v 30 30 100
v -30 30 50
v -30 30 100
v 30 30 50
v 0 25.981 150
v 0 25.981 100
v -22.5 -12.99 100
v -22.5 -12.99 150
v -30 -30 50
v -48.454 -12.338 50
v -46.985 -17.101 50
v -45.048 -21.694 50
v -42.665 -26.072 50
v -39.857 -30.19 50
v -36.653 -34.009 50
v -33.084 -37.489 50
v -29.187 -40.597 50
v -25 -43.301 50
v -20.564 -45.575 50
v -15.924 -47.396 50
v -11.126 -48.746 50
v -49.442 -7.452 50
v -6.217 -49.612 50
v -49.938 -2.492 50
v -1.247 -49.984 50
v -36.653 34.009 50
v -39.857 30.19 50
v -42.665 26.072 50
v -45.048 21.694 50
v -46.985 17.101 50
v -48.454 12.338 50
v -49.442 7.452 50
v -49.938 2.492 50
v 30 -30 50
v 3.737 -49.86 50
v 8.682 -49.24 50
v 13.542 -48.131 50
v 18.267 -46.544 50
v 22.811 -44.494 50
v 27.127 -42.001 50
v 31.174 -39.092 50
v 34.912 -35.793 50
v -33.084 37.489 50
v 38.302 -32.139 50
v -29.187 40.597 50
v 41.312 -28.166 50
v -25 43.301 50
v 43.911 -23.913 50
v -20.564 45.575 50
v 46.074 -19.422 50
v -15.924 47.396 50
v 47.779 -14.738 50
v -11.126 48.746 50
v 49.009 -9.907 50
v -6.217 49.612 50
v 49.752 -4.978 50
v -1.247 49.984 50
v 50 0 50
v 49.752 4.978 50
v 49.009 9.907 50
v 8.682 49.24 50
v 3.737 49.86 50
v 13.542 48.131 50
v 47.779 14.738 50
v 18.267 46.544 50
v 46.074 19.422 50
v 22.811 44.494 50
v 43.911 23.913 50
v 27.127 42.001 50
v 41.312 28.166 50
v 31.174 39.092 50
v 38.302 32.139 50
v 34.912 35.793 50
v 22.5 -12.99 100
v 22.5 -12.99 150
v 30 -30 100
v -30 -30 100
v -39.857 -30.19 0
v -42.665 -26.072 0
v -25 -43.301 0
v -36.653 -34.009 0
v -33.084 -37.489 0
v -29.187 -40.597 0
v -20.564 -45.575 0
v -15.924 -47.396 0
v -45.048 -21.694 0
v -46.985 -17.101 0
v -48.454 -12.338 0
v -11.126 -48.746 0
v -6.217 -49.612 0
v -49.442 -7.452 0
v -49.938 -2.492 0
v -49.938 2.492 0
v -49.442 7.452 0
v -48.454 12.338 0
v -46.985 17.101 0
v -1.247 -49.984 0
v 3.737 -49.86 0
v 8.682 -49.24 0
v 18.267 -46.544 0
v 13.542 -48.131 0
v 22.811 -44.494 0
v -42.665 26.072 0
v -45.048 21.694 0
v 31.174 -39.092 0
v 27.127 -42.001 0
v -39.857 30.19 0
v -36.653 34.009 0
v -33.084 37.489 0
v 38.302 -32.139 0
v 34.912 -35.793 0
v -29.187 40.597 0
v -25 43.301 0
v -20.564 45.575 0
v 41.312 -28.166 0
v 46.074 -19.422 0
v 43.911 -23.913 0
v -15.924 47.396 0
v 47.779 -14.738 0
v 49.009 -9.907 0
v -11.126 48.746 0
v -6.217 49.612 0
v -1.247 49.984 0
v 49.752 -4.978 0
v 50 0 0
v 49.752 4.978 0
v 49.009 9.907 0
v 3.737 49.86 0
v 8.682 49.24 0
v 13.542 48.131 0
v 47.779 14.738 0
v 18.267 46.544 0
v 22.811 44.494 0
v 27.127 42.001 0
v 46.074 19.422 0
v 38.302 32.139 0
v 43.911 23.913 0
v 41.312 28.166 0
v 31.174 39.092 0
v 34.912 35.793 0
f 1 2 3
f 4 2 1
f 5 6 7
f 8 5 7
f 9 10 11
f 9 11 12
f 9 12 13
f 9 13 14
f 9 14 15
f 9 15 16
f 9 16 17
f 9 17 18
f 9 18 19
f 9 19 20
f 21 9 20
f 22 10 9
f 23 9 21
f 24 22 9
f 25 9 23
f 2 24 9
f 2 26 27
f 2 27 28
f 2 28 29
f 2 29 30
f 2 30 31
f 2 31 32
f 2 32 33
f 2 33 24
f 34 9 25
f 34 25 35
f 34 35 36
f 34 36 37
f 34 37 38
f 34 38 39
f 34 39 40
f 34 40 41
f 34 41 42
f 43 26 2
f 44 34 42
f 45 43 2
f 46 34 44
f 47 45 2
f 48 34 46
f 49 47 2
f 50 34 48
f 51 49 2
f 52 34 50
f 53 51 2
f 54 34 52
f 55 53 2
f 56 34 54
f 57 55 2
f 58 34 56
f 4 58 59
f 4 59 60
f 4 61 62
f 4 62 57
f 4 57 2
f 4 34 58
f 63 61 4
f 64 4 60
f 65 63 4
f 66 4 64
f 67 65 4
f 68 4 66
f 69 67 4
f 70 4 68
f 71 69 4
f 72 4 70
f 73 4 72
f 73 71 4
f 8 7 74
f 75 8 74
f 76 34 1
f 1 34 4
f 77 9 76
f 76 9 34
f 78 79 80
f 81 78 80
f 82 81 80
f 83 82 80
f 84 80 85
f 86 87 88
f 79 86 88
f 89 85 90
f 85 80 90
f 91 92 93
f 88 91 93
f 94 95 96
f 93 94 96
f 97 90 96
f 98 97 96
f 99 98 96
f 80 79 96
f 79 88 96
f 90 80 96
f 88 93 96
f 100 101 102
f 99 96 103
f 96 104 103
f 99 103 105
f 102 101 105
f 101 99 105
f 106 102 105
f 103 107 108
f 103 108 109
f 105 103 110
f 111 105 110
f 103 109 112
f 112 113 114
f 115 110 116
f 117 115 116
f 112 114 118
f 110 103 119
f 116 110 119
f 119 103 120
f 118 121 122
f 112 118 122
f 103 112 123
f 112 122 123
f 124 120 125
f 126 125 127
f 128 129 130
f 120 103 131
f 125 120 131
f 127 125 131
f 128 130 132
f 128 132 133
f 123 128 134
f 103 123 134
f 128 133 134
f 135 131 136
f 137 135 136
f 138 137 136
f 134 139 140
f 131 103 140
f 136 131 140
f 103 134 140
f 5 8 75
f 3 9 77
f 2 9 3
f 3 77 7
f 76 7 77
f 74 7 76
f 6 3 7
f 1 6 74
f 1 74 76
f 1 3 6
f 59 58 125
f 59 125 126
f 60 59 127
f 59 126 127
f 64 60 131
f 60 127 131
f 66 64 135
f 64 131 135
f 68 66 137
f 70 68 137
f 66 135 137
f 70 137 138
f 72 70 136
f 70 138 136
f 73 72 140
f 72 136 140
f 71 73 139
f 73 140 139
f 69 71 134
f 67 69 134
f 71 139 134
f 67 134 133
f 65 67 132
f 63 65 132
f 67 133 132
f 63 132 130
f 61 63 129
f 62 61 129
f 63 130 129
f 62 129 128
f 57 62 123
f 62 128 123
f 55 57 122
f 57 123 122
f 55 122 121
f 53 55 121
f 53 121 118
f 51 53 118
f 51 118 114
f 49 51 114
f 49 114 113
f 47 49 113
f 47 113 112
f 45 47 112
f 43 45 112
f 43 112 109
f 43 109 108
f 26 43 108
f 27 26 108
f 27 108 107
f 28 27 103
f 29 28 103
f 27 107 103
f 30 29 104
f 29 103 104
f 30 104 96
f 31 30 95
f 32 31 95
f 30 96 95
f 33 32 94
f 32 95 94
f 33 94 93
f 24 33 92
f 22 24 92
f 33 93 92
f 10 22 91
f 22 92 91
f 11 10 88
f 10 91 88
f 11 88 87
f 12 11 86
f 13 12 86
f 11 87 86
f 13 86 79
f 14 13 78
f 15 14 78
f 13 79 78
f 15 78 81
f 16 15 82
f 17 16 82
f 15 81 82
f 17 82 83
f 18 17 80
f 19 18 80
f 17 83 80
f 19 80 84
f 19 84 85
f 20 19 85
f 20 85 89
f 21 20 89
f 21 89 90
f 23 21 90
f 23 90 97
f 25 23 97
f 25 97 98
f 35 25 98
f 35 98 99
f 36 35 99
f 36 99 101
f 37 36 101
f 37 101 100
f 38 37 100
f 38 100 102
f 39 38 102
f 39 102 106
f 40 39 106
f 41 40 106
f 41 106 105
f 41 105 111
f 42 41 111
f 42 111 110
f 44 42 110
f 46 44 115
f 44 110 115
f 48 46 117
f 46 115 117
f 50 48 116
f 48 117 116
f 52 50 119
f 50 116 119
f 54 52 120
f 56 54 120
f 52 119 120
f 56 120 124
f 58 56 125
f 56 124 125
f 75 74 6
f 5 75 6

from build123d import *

# Parameters (mm, degrees)
BOSS_EXTRUDE2_DEPTH = 150
SKETCH1_4_W         = 60
SKETCH1_4_H         = 60
BOSS_EXTRUDE3_DEPTH = 100
SKETCH1_5_R         = 50
SKETCH1_5_W         = 60
SKETCH1_5_H         = 60
BOSS_EXTRUDE4_DEPTH = 50


with BuildPart() as part:
    # Sketch1 → Boss-Extrude2 (new body)
    with BuildSketch(Plane.XY):
        Polygon((22.5, -12.990381057), (0, 25.980762114), (-22.5, -12.990381057), align=None)
    extrude(amount=BOSS_EXTRUDE2_DEPTH)

    # Sketch1<4> → Boss-Extrude3 (add)
    with BuildSketch(Plane.XY):
        Rectangle(SKETCH1_4_W, SKETCH1_4_H)
        Polygon((-22.5, -12.990381057), (0, 25.980762114), (22.5, -12.990381057), align=None, mode=Mode.SUBTRACT)
    extrude(amount=BOSS_EXTRUDE3_DEPTH)

    # Sketch1<5> → Boss-Extrude4 (add)
    with BuildSketch(Plane.XY):
        Circle(SKETCH1_5_R)
        Rectangle(SKETCH1_5_W, SKETCH1_5_H, mode=Mode.SUBTRACT)
    extrude(amount=BOSS_EXTRUDE4_DEPTH)


solid = part.part
